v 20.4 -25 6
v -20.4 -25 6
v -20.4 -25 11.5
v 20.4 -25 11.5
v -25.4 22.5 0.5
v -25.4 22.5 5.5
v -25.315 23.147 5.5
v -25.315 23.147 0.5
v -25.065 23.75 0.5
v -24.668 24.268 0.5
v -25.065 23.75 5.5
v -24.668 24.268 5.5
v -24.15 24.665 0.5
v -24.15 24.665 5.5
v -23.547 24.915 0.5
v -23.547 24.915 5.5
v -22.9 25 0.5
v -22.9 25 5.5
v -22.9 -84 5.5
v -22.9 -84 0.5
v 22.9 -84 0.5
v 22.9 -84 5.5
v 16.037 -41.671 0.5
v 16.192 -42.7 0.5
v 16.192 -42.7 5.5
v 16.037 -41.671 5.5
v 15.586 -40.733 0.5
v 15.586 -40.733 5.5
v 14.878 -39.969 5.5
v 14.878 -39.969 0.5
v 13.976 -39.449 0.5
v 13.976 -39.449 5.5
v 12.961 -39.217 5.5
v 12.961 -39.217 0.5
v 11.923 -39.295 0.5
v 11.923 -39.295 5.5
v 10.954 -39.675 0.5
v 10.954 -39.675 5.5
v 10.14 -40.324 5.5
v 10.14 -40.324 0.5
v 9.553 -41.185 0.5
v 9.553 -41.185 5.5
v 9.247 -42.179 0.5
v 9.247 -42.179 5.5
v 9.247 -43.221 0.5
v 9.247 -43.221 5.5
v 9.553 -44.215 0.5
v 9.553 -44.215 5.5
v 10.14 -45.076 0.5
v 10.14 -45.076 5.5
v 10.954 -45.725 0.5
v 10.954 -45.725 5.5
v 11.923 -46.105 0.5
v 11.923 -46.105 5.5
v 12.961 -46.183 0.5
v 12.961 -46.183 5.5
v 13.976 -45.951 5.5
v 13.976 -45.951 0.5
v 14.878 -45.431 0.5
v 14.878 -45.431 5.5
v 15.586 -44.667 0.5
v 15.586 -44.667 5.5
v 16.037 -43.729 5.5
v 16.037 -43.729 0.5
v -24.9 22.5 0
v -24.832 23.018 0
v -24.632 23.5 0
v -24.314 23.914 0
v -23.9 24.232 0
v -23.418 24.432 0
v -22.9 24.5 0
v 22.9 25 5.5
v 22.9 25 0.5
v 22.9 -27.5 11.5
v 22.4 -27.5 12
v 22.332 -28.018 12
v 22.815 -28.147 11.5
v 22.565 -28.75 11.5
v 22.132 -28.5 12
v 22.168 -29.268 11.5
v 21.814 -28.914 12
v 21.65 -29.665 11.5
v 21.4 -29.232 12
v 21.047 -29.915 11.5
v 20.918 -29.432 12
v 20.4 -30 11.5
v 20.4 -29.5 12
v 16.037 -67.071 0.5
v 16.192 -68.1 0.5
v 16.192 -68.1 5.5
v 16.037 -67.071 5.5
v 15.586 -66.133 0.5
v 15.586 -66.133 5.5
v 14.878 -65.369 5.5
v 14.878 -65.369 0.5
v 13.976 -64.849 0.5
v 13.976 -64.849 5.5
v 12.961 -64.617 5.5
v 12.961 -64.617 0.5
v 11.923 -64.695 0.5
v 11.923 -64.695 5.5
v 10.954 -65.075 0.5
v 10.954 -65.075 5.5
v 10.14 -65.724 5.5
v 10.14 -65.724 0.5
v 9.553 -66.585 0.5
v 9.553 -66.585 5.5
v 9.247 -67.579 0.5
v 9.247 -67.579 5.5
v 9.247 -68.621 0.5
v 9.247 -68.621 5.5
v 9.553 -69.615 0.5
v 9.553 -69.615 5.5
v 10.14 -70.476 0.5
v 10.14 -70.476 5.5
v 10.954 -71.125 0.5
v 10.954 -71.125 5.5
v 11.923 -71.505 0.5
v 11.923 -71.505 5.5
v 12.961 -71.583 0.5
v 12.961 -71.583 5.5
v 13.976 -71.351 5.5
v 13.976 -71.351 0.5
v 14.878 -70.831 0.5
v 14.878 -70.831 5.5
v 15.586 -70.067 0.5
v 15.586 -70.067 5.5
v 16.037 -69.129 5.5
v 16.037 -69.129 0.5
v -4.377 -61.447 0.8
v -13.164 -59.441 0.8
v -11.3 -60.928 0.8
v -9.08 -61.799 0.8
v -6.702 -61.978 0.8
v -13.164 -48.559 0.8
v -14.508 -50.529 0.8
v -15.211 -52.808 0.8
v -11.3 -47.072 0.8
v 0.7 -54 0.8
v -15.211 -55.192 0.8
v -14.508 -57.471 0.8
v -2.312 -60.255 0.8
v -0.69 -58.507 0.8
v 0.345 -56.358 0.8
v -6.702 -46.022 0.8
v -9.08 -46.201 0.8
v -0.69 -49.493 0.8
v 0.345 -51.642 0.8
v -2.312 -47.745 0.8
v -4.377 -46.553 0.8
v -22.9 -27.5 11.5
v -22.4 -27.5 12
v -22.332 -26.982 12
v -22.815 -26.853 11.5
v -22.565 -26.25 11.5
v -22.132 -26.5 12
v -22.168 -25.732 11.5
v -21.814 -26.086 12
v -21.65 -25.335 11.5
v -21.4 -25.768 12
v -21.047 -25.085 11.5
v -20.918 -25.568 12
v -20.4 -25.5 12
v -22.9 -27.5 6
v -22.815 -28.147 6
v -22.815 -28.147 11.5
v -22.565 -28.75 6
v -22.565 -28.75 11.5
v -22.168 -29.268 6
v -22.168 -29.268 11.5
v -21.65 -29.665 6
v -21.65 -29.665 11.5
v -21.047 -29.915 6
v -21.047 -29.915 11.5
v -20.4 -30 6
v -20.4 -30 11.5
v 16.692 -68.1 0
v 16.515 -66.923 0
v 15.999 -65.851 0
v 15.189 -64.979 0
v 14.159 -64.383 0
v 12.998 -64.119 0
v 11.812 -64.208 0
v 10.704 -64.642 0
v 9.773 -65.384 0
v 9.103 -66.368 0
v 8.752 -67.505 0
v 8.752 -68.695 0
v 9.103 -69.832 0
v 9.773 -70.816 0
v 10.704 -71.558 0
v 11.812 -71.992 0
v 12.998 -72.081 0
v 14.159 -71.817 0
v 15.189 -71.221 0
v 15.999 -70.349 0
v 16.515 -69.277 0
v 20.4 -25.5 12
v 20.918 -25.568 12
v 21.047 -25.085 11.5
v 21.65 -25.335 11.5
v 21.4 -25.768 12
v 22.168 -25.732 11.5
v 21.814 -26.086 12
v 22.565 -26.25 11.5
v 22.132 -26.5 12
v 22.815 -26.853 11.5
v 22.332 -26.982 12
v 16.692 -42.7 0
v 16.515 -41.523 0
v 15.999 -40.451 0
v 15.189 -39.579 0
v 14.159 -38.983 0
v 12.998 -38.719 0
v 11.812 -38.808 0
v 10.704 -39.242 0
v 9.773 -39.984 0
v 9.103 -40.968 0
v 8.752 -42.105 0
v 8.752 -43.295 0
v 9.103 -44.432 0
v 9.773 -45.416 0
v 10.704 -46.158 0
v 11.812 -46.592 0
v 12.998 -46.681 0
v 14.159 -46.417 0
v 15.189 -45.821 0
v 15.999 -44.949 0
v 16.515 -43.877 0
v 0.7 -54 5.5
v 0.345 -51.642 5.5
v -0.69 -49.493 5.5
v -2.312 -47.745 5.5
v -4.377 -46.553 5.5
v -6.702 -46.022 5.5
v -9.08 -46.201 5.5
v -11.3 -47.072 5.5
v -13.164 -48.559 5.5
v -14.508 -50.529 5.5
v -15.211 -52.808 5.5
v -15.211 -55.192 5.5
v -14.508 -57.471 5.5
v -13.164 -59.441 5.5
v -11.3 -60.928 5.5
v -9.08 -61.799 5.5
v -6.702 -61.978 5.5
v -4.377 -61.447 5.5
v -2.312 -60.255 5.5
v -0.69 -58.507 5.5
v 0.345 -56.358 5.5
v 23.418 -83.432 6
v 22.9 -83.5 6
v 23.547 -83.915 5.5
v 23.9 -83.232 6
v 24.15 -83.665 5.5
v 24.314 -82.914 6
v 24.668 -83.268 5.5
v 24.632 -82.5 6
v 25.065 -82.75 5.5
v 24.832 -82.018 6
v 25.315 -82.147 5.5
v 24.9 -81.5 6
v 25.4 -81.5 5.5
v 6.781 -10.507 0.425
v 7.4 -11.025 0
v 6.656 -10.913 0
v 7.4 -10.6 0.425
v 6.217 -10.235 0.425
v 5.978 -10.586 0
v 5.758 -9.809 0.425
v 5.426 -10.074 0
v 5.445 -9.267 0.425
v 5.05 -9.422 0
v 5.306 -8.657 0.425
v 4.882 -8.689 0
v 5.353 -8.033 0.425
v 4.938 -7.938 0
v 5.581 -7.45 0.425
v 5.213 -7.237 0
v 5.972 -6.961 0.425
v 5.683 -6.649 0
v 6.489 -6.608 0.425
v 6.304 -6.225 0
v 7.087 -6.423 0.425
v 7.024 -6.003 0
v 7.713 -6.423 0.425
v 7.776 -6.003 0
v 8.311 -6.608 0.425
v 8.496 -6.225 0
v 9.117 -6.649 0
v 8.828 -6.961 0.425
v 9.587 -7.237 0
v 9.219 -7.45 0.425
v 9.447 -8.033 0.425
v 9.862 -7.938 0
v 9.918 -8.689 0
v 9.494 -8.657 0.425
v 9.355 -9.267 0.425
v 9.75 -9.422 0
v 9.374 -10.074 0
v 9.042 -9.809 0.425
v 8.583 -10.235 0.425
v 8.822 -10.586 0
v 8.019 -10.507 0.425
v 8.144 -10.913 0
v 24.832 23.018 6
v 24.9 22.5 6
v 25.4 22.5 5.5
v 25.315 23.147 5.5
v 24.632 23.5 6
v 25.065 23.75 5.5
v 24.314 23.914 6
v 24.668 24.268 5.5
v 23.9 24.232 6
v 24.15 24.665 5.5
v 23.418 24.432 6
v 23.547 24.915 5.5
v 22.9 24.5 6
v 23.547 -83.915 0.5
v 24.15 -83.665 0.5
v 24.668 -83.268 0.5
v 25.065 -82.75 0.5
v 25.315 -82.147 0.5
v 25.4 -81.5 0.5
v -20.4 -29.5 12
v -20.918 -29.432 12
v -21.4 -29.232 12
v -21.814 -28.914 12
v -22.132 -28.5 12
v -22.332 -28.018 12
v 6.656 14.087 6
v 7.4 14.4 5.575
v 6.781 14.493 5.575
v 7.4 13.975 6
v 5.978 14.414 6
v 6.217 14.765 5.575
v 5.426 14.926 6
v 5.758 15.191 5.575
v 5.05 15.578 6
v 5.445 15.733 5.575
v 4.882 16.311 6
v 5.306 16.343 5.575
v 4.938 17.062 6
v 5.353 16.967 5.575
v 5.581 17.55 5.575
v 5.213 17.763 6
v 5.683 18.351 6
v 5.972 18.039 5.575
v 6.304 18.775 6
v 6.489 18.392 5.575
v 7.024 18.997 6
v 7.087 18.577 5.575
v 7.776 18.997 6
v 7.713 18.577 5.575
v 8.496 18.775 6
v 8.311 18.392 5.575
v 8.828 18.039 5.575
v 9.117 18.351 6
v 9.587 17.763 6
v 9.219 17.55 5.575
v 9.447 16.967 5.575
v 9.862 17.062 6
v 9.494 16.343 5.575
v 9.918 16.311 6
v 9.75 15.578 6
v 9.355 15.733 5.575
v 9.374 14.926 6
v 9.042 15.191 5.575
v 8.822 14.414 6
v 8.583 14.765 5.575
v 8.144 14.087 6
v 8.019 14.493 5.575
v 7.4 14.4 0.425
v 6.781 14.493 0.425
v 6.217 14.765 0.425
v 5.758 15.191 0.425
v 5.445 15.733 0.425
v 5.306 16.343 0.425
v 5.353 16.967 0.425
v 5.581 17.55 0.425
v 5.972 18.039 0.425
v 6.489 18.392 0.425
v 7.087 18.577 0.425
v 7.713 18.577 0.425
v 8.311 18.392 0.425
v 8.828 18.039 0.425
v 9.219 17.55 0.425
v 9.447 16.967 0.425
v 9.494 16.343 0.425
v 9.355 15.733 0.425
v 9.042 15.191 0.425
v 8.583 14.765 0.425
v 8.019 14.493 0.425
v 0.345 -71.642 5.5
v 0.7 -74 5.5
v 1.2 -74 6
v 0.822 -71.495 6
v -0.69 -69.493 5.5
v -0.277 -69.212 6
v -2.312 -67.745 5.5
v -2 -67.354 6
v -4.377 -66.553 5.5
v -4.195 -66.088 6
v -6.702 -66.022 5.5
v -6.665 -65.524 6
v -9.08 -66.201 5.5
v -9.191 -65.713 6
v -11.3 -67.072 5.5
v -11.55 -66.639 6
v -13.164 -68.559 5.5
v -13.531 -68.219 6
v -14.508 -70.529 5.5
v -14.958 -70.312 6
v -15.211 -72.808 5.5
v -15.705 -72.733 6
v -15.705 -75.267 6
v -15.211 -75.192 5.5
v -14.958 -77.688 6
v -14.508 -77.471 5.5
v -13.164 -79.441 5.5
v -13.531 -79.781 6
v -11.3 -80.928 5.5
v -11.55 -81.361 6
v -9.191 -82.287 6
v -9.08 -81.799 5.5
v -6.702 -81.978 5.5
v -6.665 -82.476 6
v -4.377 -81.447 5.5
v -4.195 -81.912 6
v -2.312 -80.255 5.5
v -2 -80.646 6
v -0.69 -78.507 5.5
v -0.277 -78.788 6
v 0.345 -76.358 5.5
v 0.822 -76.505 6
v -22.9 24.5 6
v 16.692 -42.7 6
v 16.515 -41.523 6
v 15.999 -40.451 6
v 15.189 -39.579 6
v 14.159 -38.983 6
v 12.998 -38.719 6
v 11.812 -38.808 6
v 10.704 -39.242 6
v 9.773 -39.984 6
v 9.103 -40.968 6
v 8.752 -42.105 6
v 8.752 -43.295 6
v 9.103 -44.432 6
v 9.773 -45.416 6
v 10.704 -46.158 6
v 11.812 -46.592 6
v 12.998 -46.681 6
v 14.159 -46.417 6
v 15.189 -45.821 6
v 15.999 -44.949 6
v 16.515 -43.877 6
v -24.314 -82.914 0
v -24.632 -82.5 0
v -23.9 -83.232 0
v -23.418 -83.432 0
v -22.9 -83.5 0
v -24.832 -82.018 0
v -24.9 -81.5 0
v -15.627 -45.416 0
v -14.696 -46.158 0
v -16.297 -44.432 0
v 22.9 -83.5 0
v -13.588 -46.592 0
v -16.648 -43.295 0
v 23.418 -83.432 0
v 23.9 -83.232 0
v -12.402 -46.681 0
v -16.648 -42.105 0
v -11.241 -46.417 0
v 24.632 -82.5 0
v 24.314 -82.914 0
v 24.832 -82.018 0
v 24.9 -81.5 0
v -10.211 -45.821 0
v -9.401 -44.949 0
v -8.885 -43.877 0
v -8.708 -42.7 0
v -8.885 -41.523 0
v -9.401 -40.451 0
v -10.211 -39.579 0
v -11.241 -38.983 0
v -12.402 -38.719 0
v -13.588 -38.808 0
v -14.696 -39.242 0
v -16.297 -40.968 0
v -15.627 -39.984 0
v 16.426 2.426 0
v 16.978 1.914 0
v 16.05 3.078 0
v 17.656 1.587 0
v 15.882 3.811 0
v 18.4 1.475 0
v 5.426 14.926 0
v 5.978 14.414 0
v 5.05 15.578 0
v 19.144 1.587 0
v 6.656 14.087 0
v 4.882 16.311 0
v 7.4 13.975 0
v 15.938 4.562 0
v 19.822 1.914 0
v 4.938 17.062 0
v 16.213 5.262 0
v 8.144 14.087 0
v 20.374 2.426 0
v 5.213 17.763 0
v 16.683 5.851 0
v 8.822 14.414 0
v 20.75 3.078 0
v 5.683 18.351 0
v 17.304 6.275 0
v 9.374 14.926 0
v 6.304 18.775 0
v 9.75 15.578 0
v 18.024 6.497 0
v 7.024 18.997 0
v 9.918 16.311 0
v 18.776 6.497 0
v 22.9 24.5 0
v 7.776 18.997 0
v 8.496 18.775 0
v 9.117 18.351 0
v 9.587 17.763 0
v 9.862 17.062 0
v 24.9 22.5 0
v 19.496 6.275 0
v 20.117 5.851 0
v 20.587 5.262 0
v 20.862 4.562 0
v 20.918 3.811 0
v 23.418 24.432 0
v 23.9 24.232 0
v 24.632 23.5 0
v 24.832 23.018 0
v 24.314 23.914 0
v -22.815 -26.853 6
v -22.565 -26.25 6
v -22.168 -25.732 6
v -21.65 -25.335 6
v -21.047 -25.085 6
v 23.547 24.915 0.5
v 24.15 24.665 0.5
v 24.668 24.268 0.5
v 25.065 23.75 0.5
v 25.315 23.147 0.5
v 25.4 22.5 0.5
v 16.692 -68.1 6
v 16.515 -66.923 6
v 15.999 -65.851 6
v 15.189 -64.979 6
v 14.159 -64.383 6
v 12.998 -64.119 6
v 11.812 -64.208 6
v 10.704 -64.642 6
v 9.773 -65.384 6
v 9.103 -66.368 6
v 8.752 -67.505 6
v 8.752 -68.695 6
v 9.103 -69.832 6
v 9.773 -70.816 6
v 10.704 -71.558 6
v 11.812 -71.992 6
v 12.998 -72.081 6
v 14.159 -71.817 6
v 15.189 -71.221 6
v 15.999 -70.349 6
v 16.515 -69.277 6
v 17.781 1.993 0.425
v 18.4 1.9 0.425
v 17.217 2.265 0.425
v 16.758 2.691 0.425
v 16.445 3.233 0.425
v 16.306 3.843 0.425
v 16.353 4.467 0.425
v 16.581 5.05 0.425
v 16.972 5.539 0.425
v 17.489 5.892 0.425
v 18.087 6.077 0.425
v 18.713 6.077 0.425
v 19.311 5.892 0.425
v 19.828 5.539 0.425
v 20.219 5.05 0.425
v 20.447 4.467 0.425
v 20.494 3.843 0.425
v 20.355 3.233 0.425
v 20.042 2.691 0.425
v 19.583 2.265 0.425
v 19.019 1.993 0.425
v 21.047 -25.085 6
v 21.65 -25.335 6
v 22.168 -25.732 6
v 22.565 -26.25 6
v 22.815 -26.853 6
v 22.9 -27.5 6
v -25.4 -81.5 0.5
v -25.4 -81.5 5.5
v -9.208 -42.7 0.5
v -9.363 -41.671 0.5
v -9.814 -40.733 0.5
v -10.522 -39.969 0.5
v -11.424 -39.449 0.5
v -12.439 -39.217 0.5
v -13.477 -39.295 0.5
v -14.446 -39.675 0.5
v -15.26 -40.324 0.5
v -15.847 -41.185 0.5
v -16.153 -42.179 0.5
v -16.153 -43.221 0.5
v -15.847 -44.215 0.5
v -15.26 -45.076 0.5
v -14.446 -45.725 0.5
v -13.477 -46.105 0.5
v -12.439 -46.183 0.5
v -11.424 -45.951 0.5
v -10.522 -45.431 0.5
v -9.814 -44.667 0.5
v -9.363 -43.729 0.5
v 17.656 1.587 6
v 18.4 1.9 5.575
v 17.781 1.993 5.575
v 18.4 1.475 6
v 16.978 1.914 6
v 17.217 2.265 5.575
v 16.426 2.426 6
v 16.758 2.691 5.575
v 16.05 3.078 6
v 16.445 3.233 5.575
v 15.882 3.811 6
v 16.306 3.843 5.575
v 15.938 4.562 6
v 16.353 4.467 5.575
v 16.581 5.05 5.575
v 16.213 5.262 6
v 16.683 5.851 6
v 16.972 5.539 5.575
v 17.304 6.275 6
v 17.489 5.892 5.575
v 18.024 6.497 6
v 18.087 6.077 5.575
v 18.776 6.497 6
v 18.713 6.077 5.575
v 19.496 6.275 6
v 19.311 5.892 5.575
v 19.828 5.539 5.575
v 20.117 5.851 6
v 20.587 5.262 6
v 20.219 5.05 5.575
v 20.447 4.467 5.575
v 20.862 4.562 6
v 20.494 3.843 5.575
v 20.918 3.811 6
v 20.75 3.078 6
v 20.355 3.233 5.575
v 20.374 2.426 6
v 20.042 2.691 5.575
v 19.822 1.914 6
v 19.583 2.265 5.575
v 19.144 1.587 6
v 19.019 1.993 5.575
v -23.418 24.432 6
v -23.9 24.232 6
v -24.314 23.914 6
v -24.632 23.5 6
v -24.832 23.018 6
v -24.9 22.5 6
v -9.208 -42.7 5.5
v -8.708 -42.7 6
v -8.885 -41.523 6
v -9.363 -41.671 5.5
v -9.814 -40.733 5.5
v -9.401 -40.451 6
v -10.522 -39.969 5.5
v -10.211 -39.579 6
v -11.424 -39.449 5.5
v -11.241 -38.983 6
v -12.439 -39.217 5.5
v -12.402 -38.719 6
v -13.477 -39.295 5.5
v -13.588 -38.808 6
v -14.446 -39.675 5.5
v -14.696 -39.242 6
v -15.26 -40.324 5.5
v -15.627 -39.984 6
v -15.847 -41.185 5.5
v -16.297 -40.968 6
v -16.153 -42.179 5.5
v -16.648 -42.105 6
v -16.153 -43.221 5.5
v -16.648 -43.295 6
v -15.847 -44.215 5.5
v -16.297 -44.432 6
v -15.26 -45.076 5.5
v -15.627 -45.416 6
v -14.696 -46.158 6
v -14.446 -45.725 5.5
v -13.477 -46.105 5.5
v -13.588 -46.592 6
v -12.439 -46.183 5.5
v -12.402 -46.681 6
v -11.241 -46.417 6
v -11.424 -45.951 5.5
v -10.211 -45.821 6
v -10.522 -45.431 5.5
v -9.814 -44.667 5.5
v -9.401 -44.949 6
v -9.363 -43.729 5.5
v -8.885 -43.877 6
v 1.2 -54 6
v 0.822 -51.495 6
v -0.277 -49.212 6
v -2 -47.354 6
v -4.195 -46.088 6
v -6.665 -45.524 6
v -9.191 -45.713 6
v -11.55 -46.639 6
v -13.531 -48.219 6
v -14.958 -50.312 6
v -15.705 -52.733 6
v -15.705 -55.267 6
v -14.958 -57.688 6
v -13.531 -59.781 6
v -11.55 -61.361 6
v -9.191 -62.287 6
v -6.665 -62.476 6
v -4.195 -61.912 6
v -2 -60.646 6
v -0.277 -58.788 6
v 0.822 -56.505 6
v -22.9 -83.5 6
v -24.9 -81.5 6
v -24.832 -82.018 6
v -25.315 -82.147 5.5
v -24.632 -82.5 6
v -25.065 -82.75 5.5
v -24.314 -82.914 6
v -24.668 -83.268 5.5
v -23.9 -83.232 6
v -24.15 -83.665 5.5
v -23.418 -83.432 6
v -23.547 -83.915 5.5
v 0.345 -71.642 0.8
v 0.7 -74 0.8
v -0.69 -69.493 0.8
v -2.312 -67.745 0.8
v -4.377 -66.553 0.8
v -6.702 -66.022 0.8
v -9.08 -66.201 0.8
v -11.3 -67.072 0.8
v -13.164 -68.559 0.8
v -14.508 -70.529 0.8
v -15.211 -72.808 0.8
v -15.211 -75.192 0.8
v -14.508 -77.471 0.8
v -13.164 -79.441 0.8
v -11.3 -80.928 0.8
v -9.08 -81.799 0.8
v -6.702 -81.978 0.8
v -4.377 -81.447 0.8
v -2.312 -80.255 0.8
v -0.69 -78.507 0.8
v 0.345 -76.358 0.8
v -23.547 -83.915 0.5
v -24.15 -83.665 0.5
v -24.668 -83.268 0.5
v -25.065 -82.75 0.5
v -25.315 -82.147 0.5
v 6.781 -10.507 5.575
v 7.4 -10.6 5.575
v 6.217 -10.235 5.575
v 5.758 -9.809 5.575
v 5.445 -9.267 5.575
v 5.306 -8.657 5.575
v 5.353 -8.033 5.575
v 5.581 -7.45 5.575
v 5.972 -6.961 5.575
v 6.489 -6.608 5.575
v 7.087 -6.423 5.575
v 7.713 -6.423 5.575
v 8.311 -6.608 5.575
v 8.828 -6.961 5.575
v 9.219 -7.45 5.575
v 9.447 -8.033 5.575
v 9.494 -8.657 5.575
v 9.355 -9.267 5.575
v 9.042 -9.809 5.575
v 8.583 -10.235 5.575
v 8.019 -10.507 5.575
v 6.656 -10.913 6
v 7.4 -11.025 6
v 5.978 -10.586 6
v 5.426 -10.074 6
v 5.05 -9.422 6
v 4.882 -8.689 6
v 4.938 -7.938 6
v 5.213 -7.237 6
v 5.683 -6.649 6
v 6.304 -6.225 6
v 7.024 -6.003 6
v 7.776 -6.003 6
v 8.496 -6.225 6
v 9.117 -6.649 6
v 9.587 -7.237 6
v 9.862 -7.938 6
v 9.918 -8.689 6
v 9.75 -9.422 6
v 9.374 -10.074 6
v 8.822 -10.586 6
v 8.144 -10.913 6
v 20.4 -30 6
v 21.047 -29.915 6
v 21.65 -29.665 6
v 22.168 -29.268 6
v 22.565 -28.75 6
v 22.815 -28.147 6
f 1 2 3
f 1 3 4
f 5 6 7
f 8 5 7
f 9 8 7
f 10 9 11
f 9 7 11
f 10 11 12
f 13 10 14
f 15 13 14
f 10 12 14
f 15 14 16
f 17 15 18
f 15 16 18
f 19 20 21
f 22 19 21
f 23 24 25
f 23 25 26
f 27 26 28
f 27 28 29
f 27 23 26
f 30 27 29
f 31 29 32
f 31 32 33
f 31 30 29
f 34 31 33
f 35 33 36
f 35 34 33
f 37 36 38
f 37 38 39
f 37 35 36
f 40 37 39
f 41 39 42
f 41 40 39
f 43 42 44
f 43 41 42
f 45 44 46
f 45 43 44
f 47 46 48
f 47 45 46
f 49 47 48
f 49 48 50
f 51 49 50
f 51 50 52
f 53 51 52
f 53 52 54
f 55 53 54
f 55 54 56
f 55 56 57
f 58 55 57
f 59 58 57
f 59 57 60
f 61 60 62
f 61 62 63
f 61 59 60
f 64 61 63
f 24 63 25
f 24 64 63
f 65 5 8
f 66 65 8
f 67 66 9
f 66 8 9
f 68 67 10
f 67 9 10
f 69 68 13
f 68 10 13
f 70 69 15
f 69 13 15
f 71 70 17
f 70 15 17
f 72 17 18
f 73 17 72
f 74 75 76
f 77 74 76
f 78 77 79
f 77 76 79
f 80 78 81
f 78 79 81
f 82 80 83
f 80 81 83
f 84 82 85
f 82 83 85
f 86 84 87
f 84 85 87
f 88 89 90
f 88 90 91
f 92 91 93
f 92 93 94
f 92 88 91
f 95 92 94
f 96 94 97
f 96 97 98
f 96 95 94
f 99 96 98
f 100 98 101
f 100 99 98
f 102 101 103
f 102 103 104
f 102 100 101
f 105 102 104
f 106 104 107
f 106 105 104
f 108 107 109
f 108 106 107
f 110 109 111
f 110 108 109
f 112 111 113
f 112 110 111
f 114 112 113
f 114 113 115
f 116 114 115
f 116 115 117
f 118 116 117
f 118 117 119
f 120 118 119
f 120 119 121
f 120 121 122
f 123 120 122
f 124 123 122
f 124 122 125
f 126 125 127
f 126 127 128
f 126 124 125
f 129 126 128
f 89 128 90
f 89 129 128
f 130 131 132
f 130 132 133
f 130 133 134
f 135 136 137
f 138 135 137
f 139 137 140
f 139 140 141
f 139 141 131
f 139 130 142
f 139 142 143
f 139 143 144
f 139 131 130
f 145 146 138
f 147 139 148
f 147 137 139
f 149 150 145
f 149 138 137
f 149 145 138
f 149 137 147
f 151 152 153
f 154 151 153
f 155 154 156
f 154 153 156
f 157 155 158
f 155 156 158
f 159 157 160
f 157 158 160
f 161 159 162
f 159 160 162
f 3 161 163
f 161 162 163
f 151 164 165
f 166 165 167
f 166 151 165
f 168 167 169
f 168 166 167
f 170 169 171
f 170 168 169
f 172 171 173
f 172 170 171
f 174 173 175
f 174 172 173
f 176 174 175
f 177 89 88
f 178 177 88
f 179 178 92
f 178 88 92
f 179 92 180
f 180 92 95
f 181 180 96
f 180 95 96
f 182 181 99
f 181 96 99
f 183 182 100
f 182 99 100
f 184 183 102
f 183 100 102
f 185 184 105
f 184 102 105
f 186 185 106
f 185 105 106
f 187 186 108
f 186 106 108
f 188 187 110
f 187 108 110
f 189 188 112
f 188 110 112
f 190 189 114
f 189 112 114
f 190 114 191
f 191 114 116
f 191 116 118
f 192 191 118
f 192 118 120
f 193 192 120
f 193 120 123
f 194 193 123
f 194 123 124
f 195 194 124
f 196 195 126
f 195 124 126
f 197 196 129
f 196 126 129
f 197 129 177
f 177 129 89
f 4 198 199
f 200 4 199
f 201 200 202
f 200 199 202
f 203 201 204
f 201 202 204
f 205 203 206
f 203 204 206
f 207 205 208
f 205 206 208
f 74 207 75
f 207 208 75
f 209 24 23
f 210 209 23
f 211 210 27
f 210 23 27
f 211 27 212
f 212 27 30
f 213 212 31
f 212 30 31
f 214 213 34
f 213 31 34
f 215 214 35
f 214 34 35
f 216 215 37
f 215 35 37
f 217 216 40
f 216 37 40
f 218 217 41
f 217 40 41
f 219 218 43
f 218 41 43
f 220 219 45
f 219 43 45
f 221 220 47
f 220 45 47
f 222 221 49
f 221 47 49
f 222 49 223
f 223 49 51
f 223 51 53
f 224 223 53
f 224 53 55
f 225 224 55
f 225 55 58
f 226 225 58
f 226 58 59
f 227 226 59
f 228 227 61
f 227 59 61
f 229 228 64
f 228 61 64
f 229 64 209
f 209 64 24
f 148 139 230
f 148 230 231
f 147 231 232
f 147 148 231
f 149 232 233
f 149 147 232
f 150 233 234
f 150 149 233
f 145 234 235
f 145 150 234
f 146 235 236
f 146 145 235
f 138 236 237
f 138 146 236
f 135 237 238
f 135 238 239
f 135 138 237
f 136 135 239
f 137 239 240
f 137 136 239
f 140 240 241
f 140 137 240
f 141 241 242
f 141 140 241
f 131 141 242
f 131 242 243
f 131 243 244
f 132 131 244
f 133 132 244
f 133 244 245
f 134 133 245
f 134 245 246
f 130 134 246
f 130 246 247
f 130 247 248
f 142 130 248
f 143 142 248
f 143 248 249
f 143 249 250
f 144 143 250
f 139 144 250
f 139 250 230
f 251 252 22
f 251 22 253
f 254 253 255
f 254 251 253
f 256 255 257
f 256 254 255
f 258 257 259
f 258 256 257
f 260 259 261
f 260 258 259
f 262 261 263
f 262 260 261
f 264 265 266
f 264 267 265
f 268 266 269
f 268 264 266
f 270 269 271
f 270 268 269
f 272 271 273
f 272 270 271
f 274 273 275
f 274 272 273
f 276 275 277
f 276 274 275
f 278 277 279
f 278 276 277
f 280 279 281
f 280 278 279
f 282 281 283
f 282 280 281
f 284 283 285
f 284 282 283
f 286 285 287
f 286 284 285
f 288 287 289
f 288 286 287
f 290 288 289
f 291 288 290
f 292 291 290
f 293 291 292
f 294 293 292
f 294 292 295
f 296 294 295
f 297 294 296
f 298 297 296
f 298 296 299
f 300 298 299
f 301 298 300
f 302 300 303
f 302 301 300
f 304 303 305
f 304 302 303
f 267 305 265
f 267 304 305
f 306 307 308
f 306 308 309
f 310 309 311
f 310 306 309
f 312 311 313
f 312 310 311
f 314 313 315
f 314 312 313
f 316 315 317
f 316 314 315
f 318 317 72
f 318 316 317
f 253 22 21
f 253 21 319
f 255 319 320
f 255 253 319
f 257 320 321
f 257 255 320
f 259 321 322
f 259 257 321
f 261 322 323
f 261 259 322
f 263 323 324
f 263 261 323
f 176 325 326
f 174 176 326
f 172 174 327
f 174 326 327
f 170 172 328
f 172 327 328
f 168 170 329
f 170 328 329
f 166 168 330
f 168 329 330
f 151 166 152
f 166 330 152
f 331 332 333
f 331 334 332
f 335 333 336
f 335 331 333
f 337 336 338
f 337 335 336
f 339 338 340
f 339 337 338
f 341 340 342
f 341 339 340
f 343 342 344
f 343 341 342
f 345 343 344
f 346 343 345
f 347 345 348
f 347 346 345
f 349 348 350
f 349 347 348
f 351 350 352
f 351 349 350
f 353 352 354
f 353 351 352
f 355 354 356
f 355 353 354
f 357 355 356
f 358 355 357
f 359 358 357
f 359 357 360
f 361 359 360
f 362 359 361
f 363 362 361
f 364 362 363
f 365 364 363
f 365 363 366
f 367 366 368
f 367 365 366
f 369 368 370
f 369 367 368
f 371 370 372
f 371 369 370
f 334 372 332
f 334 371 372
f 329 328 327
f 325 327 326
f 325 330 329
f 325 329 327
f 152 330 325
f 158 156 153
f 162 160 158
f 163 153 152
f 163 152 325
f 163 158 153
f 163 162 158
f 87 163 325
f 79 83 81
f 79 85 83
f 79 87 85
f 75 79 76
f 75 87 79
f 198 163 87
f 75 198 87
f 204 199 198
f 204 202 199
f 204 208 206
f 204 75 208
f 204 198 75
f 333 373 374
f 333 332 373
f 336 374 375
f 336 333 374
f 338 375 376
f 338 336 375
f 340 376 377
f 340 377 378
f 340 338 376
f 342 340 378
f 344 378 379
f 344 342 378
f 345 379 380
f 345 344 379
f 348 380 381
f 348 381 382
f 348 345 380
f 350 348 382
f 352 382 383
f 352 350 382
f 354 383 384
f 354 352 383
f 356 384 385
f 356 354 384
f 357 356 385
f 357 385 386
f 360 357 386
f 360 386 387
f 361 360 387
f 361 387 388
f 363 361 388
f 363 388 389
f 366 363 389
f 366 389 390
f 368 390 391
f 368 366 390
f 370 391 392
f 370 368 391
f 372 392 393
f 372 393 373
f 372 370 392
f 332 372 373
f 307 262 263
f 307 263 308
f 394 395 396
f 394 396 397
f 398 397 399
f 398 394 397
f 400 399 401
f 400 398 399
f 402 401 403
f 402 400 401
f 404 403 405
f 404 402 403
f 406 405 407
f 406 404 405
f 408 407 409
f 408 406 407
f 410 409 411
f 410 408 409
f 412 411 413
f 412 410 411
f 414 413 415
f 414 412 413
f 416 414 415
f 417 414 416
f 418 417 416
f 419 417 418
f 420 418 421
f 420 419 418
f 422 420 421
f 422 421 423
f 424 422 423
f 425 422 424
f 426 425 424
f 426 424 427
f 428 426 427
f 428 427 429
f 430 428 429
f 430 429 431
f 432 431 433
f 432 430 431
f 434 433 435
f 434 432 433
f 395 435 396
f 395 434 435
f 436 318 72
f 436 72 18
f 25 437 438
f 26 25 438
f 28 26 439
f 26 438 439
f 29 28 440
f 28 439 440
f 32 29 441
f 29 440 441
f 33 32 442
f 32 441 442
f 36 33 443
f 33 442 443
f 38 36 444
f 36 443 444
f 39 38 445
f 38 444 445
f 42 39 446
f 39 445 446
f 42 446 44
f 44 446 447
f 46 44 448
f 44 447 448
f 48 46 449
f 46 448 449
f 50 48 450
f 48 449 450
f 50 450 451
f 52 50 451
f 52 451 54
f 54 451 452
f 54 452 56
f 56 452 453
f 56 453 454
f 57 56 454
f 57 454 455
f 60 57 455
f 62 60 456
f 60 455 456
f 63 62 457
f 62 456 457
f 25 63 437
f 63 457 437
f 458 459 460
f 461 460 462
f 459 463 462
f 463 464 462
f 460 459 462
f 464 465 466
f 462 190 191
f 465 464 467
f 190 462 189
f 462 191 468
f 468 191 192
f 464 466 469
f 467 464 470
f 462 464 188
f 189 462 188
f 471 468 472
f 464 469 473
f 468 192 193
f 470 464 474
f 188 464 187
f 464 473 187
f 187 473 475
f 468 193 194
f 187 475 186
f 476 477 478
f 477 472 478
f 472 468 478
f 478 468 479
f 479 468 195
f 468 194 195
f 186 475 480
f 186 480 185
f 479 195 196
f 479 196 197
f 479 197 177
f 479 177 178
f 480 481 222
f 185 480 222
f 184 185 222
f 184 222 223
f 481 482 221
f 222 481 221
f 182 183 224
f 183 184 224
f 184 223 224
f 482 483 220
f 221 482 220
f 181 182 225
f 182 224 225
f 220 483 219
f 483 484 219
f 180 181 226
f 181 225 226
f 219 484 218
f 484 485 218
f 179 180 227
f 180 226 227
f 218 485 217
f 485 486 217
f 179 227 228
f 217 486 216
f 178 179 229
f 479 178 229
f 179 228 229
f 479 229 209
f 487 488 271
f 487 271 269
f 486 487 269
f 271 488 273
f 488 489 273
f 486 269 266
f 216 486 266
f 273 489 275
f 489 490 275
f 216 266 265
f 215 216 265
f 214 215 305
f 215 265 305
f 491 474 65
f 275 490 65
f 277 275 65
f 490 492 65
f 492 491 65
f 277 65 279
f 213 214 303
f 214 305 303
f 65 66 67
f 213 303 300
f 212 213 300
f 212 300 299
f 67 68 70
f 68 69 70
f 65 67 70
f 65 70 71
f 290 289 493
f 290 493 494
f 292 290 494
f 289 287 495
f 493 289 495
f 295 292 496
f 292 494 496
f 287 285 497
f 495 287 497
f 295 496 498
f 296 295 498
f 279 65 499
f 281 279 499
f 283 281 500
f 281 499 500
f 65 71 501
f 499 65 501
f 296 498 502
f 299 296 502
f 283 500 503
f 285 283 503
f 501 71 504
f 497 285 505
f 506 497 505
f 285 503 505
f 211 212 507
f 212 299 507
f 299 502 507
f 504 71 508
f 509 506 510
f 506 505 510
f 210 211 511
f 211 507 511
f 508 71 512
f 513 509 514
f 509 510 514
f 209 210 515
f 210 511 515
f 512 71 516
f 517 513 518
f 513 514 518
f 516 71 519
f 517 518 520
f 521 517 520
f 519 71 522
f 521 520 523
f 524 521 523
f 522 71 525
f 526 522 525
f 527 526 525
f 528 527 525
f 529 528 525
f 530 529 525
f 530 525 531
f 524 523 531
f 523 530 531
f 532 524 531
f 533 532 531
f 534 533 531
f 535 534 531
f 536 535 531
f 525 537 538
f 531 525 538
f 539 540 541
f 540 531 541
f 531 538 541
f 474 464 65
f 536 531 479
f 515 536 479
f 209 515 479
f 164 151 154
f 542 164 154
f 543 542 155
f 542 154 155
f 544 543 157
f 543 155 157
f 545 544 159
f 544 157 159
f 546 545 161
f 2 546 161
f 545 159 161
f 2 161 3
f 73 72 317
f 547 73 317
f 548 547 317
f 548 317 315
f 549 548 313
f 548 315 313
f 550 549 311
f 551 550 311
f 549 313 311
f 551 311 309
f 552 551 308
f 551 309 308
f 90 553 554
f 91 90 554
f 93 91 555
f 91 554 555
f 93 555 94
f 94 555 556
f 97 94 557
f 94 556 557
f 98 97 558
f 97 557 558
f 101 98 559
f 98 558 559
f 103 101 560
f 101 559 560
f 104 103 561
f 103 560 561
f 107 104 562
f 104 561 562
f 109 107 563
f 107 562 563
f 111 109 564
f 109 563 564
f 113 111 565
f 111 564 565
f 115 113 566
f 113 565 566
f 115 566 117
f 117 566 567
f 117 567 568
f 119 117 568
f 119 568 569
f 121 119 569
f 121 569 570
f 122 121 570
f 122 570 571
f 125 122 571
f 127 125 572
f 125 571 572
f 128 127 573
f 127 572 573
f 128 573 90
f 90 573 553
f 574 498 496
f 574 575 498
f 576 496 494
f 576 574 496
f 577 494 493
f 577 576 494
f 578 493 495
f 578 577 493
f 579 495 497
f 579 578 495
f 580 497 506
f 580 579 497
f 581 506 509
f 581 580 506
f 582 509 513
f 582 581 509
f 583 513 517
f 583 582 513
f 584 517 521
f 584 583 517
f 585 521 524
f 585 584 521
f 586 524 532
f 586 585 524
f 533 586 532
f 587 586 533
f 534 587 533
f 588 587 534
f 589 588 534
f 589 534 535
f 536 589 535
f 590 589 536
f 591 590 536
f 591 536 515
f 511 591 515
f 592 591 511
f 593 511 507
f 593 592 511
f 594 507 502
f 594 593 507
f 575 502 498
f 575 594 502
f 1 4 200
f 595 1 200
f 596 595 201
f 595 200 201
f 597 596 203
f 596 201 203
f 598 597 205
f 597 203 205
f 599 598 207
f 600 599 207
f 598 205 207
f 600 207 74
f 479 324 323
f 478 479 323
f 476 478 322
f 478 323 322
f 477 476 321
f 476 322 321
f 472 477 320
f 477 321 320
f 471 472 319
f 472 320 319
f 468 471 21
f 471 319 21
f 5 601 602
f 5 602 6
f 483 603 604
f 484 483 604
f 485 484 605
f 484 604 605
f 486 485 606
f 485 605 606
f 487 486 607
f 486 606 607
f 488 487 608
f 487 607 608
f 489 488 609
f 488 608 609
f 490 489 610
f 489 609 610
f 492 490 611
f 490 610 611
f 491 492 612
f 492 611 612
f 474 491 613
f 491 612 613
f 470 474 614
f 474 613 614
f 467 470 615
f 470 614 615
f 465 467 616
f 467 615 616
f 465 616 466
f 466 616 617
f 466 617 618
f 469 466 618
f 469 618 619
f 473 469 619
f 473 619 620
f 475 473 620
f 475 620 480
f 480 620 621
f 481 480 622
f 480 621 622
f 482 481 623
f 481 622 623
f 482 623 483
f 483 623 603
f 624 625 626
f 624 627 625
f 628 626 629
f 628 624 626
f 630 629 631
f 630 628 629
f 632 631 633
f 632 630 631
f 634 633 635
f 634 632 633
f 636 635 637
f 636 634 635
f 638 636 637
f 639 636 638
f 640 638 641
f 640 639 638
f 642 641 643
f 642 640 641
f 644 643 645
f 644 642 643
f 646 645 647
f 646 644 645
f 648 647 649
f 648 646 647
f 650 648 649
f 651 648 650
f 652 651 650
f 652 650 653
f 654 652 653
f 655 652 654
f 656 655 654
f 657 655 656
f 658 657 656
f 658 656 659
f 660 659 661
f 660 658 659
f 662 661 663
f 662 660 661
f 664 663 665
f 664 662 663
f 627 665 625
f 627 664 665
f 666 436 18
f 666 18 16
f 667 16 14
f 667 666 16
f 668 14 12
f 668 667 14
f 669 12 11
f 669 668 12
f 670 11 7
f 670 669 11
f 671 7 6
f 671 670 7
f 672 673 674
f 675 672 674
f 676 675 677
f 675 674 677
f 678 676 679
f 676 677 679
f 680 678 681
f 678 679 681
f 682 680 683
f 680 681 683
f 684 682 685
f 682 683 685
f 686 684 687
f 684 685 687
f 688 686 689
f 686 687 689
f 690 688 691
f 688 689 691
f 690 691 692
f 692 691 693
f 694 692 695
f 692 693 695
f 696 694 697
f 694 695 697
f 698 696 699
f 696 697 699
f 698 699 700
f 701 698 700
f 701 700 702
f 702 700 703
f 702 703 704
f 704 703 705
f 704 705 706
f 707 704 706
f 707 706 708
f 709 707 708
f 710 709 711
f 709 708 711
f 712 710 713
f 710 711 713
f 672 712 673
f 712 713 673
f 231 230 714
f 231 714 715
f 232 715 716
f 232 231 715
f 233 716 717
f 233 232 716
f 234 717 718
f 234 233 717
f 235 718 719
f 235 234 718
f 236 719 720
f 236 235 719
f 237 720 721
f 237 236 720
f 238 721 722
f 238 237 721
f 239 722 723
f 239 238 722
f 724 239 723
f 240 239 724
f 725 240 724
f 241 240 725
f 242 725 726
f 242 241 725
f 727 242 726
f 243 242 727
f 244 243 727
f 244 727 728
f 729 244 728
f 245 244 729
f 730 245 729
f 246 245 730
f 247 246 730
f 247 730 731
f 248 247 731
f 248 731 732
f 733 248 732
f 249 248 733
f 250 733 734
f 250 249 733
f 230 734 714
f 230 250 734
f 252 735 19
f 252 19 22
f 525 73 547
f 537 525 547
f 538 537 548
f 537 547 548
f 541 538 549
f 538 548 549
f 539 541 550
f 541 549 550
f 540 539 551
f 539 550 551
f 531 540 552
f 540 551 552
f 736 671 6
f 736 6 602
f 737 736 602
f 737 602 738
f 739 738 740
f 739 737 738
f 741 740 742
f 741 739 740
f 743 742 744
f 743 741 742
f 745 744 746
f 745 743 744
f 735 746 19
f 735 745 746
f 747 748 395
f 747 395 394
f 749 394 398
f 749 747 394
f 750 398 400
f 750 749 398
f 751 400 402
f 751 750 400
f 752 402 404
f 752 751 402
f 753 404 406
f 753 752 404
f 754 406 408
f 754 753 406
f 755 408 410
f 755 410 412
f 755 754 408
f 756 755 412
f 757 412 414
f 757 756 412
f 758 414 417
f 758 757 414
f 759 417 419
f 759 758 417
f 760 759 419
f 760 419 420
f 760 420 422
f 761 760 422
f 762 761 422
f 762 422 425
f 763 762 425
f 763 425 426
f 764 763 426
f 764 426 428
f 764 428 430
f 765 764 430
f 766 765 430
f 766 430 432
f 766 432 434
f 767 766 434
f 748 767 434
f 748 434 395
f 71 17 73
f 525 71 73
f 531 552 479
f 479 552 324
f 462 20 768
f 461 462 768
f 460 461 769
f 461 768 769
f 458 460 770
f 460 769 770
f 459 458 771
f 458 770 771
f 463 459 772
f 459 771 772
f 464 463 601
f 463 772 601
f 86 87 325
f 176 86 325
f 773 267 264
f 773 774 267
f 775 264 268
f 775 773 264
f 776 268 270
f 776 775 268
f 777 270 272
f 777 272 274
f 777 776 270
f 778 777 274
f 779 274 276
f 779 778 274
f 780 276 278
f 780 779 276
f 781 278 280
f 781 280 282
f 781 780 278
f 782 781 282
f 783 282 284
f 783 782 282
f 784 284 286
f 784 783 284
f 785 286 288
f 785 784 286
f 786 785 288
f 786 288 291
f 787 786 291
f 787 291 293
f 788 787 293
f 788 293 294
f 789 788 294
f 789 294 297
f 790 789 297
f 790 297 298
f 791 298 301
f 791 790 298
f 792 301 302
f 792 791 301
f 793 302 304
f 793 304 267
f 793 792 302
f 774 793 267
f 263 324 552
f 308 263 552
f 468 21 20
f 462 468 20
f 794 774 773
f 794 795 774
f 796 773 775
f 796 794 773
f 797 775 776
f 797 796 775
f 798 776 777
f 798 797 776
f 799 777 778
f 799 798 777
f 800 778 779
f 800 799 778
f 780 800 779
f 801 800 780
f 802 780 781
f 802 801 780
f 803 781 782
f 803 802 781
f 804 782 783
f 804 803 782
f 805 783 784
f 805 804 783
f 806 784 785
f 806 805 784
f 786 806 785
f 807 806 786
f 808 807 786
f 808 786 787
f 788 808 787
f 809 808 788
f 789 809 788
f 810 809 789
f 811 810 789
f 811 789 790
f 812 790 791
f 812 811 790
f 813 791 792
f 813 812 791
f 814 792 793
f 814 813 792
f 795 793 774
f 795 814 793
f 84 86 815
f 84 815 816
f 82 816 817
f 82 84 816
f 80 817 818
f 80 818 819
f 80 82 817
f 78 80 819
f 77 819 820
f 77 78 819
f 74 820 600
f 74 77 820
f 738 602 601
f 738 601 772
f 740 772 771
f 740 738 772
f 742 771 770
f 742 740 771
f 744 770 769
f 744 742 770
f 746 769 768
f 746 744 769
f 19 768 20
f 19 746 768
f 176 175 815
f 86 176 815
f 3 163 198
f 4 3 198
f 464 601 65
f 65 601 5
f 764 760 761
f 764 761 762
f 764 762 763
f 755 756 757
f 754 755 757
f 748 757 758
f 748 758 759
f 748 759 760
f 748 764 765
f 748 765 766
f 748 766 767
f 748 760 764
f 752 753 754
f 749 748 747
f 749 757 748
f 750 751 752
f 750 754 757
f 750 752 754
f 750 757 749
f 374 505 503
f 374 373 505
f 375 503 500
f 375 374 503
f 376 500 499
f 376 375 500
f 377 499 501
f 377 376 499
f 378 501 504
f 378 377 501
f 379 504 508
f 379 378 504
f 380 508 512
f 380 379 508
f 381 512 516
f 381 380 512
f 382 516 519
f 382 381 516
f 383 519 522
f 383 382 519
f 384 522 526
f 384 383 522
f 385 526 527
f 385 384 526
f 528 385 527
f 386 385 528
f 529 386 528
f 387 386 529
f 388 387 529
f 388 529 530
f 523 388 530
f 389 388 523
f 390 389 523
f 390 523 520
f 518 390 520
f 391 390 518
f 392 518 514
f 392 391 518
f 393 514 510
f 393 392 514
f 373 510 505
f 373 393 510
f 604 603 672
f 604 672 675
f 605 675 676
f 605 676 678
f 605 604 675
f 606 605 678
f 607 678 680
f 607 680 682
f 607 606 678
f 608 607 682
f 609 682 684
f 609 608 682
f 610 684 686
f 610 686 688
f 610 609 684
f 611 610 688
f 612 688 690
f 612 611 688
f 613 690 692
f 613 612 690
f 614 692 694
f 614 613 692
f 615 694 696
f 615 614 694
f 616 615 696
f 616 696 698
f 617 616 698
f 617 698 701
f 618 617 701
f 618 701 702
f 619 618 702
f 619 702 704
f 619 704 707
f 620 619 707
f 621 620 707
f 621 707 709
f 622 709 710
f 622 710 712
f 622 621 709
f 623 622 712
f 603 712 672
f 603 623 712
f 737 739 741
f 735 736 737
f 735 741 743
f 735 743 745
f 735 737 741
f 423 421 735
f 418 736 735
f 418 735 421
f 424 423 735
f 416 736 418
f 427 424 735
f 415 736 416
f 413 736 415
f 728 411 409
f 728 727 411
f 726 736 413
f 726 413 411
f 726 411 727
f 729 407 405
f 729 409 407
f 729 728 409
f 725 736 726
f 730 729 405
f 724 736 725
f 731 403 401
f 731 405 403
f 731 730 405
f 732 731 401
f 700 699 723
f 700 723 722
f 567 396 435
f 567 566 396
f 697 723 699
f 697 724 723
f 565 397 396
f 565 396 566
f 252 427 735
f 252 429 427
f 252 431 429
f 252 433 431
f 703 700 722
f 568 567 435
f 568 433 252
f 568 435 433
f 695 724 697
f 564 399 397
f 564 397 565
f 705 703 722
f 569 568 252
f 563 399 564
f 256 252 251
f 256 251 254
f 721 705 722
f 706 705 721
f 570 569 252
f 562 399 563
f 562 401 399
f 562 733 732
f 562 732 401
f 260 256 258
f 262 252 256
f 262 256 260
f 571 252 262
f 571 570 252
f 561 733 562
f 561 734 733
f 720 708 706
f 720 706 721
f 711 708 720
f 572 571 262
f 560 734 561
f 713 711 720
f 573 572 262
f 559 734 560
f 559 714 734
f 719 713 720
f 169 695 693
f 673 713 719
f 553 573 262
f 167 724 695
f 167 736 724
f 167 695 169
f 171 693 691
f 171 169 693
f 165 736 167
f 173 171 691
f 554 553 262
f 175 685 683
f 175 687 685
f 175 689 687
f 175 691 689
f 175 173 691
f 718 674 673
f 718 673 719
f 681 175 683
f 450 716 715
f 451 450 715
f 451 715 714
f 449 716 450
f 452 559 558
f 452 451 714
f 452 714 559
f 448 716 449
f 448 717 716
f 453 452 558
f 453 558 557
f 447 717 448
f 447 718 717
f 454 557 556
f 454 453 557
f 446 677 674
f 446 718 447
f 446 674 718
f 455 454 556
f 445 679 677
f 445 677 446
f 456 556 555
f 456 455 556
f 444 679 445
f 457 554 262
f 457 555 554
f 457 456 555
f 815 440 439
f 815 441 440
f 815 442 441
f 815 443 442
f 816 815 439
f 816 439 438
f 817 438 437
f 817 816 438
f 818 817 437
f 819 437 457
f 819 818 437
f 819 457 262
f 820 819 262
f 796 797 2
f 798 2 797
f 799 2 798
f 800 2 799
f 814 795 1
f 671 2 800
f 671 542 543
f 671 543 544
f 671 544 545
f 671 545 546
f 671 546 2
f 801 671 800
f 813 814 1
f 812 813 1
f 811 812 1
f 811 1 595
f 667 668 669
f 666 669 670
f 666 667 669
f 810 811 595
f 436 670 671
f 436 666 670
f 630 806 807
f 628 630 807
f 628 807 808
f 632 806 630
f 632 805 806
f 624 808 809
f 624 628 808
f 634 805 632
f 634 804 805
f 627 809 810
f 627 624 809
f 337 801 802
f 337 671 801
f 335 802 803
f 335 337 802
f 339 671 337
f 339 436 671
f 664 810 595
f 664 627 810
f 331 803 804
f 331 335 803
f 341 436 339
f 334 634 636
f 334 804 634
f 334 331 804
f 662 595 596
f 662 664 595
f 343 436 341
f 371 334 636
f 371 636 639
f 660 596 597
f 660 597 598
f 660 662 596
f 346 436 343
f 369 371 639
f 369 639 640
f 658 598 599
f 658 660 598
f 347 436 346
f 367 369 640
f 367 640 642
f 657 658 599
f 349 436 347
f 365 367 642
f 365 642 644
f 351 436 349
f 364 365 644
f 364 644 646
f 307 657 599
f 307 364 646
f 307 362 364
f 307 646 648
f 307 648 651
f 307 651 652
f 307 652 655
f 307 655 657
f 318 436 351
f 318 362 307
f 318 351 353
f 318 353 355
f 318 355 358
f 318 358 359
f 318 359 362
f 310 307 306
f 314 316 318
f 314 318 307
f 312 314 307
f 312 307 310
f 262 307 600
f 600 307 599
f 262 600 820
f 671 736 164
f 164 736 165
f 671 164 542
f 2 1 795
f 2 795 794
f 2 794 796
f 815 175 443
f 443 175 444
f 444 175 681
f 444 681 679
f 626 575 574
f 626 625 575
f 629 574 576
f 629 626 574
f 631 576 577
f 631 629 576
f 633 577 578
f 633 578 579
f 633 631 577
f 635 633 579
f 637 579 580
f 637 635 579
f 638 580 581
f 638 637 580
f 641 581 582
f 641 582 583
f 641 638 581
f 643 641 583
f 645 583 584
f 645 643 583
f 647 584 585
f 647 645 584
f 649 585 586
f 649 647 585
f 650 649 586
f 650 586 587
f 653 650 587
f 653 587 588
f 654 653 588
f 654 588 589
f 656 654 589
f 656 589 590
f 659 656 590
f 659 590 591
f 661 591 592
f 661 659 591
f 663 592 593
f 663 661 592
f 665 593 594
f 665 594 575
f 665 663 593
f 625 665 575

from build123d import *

# Parameters (mm, degrees)
MAIN_FEATURES_SKETCH_W         = 50.8
MAIN_FEATURES_SKETCH_H         = 109
MAIN_FEATURES_SKETCH_R         = 3.4925
MAIN_FEATURES_SKETCH_R_2       = 8
MAIN_BODY_DEPTH                = 6
SKETCH1_5_W                    = 45.8
SKETCH1_5_H                    = 5
LEDGE_DEPTH                    = 12
SKETCH1_4_R                    = 8
SCREW_HEAD_RECESSES_DEPTH      = 0.8
M5X0_8_TAPPED_HOLE1_AT_2_COUNT = 2
M5X0_8_TAPPED_HOLE1_AT_2_PITCH = 25
M5X0_8_TAPPED_HOLE1_AT_3_COUNT = 2
M5X0_8_TAPPED_HOLE1_AT_3_PITCH = 16.650825805
FILLET1_R                      = 2.5
CHAMFER1_SIZE                  = 0.5


with BuildPart() as part:
    # main_features_sketch → main_body (new body)
    with BuildSketch(Plane.XY):
        with Locations((0, -29.5)):
            Rectangle(MAIN_FEATURES_SKETCH_W, MAIN_FEATURES_SKETCH_H)
        with Locations((12.7, -42.7)):
            Circle(MAIN_FEATURES_SKETCH_R, mode=Mode.SUBTRACT)
        with Locations((12.7, -68.1)):
            Circle(MAIN_FEATURES_SKETCH_R, mode=Mode.SUBTRACT)
        with Locations((-7.3, -54)):
            Circle(MAIN_FEATURES_SKETCH_R_2, mode=Mode.SUBTRACT)
        with Locations((-7.3, -74)):
            Circle(MAIN_FEATURES_SKETCH_R_2, mode=Mode.SUBTRACT)
        with Locations((-12.7, -42.7)):
            Circle(MAIN_FEATURES_SKETCH_R, mode=Mode.SUBTRACT)
    extrude(amount=MAIN_BODY_DEPTH)

    # Sketch1<5> → ledge (add)
    with BuildSketch(Plane.XY):
        with Locations((0, -27.5)):
            Rectangle(SKETCH1_5_W, SKETCH1_5_H)
    extrude(amount=LEDGE_DEPTH)

    # Sketch1<4> → screw_head_recesses (add)
    with BuildSketch(Plane.XY):
        with Locations((-7.3, -54)):
            Circle(SKETCH1_4_R)
        with Locations((-7.3, -74)):
            Circle(SKETCH1_4_R)
    extrude(amount=SCREW_HEAD_RECESSES_DEPTH)

    # Sketch3 → M5x0.8 Tapped Hole1 (revolve, cut)
    with BuildSketch(Plane(origin=(7.4, -8.5, 6), x_dir=(0, -1, 0), z_dir=(1, 0, 0))):
        Polygon((0, 0), (0, 6), (2.525, 6), (2.1, 5.575), (2.1, 0.425), (2.525, 0), align=None)
    m5x0_8_tapped_hole1 = revolve(axis=Axis((7.4, -8.5, 12.35), (0, 0, -1)), mode=Mode.SUBTRACT)

    # M5x0.8 Tapped Hole1 at 2: M5x0.8 Tapped Hole1 ×2
    with Locations(*[(0, i * M5X0_8_TAPPED_HOLE1_AT_2_PITCH, 0) for i in range(1, M5X0_8_TAPPED_HOLE1_AT_2_COUNT)]):
        add(m5x0_8_tapped_hole1, mode=Mode.SUBTRACT)

    # M5x0.8 Tapped Hole1 at 3: M5x0.8 Tapped Hole1 ×2
    with Locations(*[Vector(0.6606278948920246, 0.7507135169227555, 0) * (i * M5X0_8_TAPPED_HOLE1_AT_3_PITCH) for i in range(1, M5X0_8_TAPPED_HOLE1_AT_3_COUNT)]):
        add(m5x0_8_tapped_hole1, mode=Mode.SUBTRACT)

    # Fillet1
    fillet1_edges = [part.edges().sort_by_distance(p)[0] for p in [
        (25.4, 25, 3),
        (-25.4, 25, 3),
        (25.4, -84, 3),
        (-25.4, -84, 3),
        (22.9, -25, 9),
        (22.9, -30, 9),
        (-22.9, -25, 9),
        (-22.9, -30, 9),
    ]]
    fillet(fillet1_edges, radius=FILLET1_R - 0.0001)  # a hair under: the kernel refuses the full size

    # Chamfer1
    chamfer1_edges = [part.edges().sort_by_distance(p)[0] for p in [
        (0, 25, 0),
        (-24.667796242, 24.267796242, 0),
        (24.667796242, 24.267796242, 0),
        (-24.667796242, -83.267796242, 0),
        (24.667796242, -83.267796242, 0),
        (0, -84, 6),
        (0, 25, 6),
        (-25.4, -29.5, 6),
        (-24.667796242, 24.267796242, 6),
        (24.667796242, 24.267796242, 6),
        (-24.667796242, -83.267796242, 6),
        (24.667796242, -83.267796242, 6),
        (-16.1925, -42.7, 0),
        (9.2075, -42.7, 0),
        (9.2075, -68.1, 0),
        (9.2075, -68.1, 6),
        (-15.3, -74, 6),
        (-15.3, -54, 6),
        (9.2075, -42.7, 6),
        (-16.1925, -42.7, 6),
        (0, -25, 12),
        (0, -30, 12),
        (-22.167796242, -29.267796242, 12),
        (-22.167796242, -25.732203758, 12),
        (22.167796242, -29.267796242, 12),
        (22.167796242, -25.732203758, 12),
        (25.4, -29.5, 0),
        (25.4, -29.5, 6),
        (0, -84, 0),
        (-25.4, -29.5, 0),
    ]]
    chamfer(chamfer1_edges, length=CHAMFER1_SIZE)


solid = part.part
